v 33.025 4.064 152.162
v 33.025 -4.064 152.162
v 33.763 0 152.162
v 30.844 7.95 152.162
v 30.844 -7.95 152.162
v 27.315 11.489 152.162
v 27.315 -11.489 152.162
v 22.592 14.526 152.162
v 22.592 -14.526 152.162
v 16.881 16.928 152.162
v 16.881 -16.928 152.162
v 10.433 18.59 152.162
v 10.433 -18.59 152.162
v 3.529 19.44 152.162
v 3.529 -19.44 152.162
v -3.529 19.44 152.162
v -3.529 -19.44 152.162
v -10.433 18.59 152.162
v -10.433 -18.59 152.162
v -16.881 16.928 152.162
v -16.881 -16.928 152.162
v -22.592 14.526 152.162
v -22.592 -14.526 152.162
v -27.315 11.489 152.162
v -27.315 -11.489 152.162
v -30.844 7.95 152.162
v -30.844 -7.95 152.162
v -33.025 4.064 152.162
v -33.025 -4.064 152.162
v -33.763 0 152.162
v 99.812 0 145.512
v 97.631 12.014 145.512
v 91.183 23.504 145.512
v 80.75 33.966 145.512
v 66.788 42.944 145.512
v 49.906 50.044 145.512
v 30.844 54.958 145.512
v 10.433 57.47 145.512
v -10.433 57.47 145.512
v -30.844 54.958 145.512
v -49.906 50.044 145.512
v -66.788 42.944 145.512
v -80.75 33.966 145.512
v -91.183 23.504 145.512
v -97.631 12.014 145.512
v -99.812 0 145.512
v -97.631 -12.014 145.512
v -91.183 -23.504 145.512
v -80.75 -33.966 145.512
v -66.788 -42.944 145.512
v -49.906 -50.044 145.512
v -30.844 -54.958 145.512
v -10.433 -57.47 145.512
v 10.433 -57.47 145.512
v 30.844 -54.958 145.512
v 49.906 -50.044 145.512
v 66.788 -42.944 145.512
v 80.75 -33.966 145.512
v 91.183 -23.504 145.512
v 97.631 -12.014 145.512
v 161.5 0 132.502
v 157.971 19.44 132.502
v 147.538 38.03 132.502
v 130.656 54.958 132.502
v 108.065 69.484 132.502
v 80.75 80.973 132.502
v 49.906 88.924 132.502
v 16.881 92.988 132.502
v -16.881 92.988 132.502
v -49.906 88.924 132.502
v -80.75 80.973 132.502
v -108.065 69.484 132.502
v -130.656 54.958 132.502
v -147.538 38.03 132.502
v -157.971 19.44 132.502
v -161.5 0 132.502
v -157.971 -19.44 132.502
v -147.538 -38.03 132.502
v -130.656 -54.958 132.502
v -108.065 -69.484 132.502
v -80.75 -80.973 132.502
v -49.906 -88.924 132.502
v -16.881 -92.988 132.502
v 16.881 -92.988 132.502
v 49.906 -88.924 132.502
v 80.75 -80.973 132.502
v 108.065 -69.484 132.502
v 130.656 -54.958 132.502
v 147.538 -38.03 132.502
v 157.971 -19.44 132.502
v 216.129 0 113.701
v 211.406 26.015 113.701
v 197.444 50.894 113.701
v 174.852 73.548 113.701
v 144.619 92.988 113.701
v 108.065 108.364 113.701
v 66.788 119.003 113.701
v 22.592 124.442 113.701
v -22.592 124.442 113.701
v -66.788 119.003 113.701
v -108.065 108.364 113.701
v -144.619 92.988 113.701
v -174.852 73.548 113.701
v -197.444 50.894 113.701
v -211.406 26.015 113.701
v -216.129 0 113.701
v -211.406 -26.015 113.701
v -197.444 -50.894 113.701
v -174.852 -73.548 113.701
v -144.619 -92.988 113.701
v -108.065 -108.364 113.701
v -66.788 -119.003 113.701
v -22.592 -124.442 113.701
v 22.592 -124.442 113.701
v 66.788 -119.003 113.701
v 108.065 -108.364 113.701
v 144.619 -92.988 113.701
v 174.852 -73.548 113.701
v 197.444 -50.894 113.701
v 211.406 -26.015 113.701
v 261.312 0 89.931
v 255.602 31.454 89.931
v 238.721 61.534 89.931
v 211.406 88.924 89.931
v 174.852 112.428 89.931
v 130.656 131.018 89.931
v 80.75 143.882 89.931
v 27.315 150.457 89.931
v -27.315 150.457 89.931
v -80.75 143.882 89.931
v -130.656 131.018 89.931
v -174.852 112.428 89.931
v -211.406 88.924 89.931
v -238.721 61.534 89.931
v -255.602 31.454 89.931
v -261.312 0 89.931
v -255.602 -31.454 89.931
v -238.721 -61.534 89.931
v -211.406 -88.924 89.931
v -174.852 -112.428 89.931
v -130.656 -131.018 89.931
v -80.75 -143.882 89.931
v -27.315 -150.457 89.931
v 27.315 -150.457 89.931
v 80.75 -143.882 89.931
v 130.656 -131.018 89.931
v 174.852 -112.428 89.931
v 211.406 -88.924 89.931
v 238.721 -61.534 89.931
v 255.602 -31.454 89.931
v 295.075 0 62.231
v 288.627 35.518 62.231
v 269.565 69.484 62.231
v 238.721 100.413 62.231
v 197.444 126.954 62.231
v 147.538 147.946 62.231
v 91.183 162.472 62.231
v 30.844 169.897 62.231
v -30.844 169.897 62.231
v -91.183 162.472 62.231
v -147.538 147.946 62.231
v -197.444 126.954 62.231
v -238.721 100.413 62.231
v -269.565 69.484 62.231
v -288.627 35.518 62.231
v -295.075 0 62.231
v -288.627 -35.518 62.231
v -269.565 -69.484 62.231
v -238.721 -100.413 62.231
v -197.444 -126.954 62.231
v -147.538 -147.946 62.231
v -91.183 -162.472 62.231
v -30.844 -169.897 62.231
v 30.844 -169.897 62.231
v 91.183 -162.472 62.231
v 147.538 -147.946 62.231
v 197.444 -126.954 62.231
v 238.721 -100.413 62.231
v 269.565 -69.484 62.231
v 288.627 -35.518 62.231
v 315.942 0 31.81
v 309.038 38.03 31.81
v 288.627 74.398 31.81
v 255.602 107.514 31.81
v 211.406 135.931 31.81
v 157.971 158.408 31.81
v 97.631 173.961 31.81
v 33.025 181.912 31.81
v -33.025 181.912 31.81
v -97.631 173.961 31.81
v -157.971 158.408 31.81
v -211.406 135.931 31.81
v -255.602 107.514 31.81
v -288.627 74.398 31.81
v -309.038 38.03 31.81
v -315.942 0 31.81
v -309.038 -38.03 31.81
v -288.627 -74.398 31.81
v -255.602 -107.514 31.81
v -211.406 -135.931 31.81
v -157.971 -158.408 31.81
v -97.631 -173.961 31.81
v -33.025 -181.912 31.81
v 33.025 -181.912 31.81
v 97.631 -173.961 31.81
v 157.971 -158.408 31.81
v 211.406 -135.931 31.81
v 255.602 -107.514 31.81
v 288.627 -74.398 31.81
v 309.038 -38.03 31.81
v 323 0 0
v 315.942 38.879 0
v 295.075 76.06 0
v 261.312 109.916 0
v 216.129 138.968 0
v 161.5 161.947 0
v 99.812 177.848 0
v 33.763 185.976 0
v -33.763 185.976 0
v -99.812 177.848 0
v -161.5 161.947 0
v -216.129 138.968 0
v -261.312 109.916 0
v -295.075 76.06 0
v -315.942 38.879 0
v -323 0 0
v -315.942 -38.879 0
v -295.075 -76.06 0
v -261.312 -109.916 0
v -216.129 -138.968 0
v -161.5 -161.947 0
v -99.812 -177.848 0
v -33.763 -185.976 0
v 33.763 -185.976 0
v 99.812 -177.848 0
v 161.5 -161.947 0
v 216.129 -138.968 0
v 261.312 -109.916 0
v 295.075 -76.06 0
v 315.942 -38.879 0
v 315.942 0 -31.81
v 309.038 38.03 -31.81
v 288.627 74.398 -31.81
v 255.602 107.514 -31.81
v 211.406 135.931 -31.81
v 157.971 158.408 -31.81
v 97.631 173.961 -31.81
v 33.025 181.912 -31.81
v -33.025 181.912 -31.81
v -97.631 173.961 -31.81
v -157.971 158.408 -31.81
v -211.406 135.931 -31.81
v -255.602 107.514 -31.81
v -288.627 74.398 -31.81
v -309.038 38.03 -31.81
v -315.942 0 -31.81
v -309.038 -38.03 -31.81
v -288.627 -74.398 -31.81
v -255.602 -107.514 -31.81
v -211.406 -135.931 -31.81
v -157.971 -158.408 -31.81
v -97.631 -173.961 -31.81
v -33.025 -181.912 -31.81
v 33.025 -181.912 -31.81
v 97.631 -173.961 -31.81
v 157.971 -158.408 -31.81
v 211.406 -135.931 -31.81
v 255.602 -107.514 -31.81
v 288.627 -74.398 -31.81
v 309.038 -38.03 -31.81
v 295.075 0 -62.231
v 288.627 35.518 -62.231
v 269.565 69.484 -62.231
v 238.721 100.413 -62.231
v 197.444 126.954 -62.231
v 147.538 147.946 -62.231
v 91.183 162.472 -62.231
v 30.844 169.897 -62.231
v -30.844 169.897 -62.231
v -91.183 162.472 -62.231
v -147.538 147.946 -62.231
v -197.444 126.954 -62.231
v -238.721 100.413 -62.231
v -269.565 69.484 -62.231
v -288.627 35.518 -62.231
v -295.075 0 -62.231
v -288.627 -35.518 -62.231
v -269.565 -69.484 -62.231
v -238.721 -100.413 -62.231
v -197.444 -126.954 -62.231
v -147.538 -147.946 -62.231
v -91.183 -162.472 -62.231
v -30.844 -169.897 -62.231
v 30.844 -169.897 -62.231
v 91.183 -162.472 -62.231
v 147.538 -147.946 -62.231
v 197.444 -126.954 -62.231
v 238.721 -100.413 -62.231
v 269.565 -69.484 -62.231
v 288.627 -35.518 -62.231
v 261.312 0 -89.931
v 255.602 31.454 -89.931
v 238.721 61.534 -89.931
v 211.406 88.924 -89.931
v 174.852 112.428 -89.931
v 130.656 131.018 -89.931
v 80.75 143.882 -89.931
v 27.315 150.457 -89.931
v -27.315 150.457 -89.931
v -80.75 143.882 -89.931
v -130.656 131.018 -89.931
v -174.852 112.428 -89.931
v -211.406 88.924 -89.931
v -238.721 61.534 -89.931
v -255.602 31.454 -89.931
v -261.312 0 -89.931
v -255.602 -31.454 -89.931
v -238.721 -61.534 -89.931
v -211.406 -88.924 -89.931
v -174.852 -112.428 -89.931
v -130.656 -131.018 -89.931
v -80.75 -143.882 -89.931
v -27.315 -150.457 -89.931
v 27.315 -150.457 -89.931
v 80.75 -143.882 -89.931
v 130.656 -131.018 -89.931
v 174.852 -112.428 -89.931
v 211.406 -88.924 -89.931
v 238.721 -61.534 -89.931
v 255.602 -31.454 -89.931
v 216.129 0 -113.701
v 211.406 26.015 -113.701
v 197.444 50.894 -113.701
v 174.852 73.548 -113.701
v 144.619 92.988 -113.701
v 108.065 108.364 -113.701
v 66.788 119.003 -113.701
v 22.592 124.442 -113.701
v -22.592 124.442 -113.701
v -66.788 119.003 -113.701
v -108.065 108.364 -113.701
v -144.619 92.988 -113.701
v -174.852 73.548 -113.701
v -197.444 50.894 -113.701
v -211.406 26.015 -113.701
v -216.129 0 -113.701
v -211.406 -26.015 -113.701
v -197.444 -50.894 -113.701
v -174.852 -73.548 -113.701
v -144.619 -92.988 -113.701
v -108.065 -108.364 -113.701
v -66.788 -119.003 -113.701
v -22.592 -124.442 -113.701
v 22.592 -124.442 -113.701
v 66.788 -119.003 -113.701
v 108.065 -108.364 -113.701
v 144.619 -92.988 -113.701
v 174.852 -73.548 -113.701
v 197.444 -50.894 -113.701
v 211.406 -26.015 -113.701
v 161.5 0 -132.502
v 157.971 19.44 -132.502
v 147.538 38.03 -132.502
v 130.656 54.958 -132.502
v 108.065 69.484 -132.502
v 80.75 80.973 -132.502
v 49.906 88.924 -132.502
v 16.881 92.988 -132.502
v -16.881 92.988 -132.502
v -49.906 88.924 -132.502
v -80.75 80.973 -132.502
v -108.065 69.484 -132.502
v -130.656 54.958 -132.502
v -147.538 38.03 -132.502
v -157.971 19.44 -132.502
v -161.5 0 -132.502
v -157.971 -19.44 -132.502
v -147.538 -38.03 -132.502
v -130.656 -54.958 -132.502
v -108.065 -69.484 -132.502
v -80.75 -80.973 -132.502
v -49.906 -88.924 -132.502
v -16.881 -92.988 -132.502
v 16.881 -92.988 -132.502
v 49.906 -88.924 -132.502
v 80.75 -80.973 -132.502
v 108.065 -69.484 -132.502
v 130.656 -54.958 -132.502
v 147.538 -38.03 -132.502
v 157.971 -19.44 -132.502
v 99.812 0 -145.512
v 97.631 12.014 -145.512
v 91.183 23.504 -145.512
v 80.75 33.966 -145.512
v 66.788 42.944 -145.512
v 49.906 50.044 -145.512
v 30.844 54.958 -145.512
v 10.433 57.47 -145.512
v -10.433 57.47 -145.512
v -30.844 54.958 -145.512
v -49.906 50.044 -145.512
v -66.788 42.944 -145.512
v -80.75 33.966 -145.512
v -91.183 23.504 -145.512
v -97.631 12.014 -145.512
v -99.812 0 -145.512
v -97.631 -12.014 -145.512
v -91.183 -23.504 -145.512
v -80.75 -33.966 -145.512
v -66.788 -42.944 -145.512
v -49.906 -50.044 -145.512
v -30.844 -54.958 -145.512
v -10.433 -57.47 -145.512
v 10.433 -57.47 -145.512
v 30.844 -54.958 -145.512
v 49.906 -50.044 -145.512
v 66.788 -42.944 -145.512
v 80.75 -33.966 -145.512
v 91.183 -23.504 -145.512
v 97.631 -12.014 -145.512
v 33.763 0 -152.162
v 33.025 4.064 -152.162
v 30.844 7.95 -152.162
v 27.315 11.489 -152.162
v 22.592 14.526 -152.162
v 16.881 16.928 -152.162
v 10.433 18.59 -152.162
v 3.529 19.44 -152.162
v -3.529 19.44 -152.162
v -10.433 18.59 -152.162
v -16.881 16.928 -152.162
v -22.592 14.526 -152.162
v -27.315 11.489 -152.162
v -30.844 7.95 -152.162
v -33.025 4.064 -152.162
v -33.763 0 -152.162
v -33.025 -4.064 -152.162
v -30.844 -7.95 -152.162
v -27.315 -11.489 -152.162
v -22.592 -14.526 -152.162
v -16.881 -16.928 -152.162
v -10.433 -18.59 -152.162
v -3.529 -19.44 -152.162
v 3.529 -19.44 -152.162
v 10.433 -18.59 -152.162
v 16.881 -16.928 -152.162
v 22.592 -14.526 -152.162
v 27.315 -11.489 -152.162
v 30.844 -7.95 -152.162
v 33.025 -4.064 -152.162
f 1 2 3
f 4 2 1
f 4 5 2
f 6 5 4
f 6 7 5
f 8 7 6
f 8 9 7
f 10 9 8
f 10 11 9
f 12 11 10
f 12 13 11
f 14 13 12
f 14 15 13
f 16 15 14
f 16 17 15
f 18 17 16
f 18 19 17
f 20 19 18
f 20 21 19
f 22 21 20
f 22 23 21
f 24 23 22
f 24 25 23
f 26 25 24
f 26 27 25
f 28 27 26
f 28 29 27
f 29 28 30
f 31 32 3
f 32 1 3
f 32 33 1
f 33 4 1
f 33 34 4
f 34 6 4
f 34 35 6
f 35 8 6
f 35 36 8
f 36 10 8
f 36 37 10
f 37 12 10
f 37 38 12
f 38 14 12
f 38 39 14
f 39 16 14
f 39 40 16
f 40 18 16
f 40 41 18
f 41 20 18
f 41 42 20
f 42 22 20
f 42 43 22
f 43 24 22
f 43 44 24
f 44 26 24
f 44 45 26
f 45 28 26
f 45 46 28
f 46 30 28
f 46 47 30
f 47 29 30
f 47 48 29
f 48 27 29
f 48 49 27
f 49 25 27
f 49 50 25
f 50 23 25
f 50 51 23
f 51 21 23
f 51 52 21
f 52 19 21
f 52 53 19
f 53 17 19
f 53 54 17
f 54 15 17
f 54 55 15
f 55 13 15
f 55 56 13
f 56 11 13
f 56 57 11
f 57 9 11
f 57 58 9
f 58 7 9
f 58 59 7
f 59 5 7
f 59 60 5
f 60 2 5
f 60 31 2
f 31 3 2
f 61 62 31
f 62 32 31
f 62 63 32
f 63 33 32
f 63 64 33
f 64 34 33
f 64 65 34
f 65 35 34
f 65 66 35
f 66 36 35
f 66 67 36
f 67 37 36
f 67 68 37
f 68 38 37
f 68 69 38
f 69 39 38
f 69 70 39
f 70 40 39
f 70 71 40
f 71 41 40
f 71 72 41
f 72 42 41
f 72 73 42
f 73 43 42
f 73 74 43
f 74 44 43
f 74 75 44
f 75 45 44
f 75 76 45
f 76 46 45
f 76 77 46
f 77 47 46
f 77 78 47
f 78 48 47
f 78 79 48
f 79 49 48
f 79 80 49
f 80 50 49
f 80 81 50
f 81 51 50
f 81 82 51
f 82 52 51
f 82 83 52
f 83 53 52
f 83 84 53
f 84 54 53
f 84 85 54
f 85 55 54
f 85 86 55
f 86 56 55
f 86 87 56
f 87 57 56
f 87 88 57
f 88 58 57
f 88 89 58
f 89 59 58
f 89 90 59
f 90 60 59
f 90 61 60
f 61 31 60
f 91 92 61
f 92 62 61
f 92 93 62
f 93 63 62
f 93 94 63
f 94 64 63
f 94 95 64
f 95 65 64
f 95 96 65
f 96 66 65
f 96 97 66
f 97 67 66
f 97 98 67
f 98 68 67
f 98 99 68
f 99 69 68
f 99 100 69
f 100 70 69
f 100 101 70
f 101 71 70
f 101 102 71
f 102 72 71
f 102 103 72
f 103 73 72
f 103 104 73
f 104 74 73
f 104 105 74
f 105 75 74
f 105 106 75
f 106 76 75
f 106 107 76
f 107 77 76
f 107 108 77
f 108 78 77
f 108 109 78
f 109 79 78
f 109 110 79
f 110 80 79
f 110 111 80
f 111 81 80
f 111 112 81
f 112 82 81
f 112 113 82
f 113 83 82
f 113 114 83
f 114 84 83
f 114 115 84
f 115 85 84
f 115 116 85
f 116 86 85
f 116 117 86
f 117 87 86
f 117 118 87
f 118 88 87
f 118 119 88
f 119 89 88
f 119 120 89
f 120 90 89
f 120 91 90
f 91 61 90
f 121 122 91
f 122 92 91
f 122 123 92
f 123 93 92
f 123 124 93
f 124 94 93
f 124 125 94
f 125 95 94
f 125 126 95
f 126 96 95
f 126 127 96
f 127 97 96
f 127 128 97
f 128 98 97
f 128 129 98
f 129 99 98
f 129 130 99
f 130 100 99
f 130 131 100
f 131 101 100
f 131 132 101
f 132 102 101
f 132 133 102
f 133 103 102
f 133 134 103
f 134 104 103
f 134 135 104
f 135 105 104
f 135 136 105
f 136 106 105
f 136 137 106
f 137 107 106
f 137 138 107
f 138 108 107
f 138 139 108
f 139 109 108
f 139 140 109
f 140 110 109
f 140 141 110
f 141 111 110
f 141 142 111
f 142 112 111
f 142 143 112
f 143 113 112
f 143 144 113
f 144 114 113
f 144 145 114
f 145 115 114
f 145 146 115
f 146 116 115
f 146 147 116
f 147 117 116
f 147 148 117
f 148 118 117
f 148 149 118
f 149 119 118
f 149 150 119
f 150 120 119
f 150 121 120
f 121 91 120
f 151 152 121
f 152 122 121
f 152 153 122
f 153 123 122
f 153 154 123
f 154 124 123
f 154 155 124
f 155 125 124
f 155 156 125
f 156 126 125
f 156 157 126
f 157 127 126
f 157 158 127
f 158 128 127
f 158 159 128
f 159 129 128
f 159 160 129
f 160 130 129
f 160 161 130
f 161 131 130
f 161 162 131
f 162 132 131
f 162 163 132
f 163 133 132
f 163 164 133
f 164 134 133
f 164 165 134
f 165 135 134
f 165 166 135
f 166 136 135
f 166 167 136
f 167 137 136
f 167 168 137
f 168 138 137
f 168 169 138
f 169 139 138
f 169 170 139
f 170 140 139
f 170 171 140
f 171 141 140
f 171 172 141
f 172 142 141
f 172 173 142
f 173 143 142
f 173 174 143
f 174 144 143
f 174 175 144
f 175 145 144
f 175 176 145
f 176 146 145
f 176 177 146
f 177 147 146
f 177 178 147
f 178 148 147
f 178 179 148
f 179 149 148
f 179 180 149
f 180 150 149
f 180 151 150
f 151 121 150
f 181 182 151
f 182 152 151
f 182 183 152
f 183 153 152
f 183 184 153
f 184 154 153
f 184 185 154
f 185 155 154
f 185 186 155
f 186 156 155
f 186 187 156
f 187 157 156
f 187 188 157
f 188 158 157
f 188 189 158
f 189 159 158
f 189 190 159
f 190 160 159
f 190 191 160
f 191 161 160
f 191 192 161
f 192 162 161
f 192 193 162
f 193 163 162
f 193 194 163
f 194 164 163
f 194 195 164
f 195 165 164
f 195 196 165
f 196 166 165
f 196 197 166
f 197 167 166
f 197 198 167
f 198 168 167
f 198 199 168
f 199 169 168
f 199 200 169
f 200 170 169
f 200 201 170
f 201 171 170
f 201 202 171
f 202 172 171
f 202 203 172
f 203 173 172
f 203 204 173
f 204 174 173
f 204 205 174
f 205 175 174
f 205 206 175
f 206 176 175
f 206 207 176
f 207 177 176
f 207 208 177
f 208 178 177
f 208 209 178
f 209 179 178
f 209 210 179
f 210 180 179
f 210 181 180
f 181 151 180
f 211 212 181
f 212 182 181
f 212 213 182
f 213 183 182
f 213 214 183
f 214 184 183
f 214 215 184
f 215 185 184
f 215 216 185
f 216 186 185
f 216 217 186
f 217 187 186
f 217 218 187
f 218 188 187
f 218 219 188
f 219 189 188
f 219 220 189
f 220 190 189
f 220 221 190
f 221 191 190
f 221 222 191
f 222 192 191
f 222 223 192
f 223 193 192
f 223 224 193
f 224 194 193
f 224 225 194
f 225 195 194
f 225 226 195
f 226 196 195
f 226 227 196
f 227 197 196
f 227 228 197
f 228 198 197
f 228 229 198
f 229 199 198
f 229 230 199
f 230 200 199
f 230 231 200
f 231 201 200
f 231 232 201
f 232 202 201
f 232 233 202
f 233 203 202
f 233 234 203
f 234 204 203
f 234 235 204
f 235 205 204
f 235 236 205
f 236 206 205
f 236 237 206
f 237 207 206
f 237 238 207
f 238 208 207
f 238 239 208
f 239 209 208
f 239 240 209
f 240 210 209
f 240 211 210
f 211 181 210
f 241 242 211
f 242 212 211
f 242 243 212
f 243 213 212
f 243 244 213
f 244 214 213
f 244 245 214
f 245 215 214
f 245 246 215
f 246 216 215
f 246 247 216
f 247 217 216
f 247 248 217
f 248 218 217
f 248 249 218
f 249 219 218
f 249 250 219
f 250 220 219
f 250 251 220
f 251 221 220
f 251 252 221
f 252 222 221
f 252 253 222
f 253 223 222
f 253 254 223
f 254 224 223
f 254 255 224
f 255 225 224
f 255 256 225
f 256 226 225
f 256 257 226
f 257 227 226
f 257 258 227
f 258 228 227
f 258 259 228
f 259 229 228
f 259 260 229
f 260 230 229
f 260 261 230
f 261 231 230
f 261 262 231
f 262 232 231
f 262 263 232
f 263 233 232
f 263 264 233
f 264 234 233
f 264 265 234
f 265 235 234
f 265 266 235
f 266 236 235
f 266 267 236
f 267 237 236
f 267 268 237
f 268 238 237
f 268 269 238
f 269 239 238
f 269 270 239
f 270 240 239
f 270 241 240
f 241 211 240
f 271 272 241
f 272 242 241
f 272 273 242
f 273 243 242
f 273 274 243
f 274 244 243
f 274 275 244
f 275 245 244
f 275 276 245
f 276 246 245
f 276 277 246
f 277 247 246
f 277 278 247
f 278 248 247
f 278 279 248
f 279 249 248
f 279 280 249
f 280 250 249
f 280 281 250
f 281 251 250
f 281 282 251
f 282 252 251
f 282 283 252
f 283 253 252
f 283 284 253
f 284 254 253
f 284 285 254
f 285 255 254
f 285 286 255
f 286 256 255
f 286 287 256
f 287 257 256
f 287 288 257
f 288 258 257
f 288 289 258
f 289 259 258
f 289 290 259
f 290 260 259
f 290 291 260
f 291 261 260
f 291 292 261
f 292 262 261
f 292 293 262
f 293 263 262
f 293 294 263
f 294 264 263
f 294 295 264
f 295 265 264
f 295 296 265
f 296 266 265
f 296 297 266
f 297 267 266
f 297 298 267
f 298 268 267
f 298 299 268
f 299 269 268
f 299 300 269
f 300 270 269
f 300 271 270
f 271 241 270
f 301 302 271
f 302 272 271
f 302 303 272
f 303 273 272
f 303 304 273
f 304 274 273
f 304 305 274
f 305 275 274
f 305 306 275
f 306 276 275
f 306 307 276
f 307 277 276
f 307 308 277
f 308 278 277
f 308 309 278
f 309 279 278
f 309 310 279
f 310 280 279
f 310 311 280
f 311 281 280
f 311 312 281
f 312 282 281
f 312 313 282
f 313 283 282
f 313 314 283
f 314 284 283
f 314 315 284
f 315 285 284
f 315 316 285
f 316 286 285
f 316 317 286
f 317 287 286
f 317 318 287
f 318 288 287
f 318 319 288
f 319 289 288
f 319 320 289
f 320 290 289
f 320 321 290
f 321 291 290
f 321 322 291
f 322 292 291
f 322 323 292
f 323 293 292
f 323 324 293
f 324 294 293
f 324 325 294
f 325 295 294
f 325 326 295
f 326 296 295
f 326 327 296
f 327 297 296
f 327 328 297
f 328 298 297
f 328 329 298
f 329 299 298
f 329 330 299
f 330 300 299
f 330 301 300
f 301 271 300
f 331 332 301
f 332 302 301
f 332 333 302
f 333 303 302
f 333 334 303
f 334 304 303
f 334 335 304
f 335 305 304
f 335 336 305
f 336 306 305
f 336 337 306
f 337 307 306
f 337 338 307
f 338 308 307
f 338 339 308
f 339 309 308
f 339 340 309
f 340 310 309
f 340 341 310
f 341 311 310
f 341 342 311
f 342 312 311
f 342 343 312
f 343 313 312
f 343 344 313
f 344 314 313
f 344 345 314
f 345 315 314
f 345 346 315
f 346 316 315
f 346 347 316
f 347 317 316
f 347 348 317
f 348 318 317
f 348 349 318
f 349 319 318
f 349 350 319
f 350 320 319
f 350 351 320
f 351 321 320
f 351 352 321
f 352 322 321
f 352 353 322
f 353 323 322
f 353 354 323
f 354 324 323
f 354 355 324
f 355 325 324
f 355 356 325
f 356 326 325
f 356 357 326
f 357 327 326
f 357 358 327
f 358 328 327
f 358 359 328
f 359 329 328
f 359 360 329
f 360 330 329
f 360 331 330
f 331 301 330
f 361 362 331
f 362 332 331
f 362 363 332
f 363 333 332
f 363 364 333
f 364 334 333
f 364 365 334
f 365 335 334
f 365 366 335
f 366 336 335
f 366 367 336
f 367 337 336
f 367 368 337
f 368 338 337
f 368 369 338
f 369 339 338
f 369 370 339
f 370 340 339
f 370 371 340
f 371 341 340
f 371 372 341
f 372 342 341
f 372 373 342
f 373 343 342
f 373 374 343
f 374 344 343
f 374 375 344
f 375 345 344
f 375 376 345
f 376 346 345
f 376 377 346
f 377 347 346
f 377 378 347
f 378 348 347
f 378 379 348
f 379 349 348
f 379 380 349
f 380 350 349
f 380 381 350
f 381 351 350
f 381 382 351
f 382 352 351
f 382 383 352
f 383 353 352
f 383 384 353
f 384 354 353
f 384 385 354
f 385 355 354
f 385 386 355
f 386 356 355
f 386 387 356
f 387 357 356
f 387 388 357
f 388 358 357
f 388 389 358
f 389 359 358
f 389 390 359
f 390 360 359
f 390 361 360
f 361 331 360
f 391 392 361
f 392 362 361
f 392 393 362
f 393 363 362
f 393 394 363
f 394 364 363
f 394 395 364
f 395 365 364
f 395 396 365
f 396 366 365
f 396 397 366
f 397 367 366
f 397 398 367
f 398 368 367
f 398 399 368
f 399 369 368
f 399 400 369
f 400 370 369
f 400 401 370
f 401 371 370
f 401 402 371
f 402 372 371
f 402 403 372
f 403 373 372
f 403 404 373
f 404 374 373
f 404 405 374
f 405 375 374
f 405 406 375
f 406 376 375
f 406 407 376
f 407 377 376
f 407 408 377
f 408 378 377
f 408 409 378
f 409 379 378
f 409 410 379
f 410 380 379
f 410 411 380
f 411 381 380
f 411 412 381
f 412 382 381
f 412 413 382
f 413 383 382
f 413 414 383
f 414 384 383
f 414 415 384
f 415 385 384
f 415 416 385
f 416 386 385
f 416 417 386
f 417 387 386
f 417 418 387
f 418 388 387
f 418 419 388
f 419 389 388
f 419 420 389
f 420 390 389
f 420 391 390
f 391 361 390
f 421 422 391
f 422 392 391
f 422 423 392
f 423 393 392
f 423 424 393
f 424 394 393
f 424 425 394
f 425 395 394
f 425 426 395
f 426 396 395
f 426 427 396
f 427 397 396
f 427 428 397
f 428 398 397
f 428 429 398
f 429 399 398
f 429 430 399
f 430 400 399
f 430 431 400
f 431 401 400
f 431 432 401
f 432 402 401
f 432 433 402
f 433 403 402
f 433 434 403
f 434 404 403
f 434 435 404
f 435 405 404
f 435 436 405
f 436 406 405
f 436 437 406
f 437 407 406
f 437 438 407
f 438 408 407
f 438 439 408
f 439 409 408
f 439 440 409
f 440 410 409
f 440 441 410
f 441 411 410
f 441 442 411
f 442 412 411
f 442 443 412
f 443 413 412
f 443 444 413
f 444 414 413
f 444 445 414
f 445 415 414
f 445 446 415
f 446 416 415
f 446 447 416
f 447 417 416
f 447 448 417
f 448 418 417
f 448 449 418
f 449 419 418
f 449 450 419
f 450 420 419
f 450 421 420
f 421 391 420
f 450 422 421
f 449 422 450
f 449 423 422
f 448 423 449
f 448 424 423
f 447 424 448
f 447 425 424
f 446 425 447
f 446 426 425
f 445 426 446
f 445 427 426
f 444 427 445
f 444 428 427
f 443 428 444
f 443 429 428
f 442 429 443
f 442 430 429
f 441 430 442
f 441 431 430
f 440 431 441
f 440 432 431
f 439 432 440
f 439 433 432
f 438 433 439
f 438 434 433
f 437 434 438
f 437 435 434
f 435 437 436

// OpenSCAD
// Generated by SolidPython 1.0.1 on 2020-07-29 00:46:54


scale(v = [19, 11, 9]) {
	sphere(r = 17);
}
/***********************************************
*********      SolidPython code:      **********
************************************************
 
# import packages: SolidPython
from solid import *
from solid.utils import *
from itertools import chain, combinations, permutations


class Resize:

    def __init__(self, scad_file):
        self.scad_file = scad_file
        #self.scad_file = import_scad(scad_file)
        # cone/cylinder param:
        self.r1 = 0
        self.r2 = 0
        self.h = 0
        # rectangular prism param:
        self.w = 0
        self.l = 0
        # ellipse param:
        self.r = 0

    # import OpenScad code (file name corresponds to shape)


    # classify shape + parameters
    def assign(self, param1, param2, param3):
        if self.scad_file == 'cone.scad':
            self.r1 = param1
            self.r2 = param2
            self.h = param3
        elif self.scad_file == 'cylinder.scad':
            self.r1 = param1
            self.r2 = param2
            self.h = param3
        elif self.scad_file == 'rectangularPrism.scad':
            self.h = param1
            self.l = param2
            self.w = param3
        else:
            self.r = param1
            self.h = param2

    # resize parameters
    def iterate(self):
        x = range(3, 20, 2)
        i = 1
        if self.scad_file == 'cone.scad':
            tempList = list(permutations(x, 2))
            for temp in tempList:
                param1 = temp[0]
                param2 = temp[1]
                filepath = 'produced_scad_files/' + 'cone' + str(param1) + '_' + str(param2) + '_' + '.scad'
                scad_render_to_file(cylinder(h=param1, r1=param2, r2=0), filepath)

        elif self.scad_file == 'cylinder.scad':
            tempList = list(permutations(x, 3))
            for temp in tempList:
                param1 = temp[0]
                param2 = temp[1]
                filepath = 'produced_scad_files/' + 'cylinder' + str(param1) + '_' + str(param2) + '_' + '.scad'
                scad_render_to_file(cylinder(h=param1, r1=param2, r2=param2), filepath)

        elif self.scad_file == 'rectangularPrism.scad':
            tempList = list(permutations(x, 3))
            for temp in tempList:
                param1 = temp[0]
                param2 = temp[1]
                param3 = temp[2]
                filepath = 'produced_scad_files/' + 'rectangularPrism' + str(param1) + '_' + str(param2) + '_' + str(
                    param3) + '.scad'
                scad_render_to_file(cube(size=(param1, param2, param3)), filepath)

        elif self.scad_file == 'ellipse.scad':
            tempList = list(permutations(x, 4))
            for temp in tempList:
                param1 = temp[0]
                param2 = temp[1]
                param3 = temp[2]
                param4 = temp[3]
                filepath = 'produced_scad_files/' + 'ellipse' + str(param1) + '_' + str(param2) + '_' + str(param3) + '_' + str(param4) + '.scad'
                scad_render_to_file(scale([param1, param2, param3])(sphere(r=param4)), filepath)

    def render_to_scadfile(self):
        scad_render_to_file(scad, 'example.scad') 
 
************************************************/
